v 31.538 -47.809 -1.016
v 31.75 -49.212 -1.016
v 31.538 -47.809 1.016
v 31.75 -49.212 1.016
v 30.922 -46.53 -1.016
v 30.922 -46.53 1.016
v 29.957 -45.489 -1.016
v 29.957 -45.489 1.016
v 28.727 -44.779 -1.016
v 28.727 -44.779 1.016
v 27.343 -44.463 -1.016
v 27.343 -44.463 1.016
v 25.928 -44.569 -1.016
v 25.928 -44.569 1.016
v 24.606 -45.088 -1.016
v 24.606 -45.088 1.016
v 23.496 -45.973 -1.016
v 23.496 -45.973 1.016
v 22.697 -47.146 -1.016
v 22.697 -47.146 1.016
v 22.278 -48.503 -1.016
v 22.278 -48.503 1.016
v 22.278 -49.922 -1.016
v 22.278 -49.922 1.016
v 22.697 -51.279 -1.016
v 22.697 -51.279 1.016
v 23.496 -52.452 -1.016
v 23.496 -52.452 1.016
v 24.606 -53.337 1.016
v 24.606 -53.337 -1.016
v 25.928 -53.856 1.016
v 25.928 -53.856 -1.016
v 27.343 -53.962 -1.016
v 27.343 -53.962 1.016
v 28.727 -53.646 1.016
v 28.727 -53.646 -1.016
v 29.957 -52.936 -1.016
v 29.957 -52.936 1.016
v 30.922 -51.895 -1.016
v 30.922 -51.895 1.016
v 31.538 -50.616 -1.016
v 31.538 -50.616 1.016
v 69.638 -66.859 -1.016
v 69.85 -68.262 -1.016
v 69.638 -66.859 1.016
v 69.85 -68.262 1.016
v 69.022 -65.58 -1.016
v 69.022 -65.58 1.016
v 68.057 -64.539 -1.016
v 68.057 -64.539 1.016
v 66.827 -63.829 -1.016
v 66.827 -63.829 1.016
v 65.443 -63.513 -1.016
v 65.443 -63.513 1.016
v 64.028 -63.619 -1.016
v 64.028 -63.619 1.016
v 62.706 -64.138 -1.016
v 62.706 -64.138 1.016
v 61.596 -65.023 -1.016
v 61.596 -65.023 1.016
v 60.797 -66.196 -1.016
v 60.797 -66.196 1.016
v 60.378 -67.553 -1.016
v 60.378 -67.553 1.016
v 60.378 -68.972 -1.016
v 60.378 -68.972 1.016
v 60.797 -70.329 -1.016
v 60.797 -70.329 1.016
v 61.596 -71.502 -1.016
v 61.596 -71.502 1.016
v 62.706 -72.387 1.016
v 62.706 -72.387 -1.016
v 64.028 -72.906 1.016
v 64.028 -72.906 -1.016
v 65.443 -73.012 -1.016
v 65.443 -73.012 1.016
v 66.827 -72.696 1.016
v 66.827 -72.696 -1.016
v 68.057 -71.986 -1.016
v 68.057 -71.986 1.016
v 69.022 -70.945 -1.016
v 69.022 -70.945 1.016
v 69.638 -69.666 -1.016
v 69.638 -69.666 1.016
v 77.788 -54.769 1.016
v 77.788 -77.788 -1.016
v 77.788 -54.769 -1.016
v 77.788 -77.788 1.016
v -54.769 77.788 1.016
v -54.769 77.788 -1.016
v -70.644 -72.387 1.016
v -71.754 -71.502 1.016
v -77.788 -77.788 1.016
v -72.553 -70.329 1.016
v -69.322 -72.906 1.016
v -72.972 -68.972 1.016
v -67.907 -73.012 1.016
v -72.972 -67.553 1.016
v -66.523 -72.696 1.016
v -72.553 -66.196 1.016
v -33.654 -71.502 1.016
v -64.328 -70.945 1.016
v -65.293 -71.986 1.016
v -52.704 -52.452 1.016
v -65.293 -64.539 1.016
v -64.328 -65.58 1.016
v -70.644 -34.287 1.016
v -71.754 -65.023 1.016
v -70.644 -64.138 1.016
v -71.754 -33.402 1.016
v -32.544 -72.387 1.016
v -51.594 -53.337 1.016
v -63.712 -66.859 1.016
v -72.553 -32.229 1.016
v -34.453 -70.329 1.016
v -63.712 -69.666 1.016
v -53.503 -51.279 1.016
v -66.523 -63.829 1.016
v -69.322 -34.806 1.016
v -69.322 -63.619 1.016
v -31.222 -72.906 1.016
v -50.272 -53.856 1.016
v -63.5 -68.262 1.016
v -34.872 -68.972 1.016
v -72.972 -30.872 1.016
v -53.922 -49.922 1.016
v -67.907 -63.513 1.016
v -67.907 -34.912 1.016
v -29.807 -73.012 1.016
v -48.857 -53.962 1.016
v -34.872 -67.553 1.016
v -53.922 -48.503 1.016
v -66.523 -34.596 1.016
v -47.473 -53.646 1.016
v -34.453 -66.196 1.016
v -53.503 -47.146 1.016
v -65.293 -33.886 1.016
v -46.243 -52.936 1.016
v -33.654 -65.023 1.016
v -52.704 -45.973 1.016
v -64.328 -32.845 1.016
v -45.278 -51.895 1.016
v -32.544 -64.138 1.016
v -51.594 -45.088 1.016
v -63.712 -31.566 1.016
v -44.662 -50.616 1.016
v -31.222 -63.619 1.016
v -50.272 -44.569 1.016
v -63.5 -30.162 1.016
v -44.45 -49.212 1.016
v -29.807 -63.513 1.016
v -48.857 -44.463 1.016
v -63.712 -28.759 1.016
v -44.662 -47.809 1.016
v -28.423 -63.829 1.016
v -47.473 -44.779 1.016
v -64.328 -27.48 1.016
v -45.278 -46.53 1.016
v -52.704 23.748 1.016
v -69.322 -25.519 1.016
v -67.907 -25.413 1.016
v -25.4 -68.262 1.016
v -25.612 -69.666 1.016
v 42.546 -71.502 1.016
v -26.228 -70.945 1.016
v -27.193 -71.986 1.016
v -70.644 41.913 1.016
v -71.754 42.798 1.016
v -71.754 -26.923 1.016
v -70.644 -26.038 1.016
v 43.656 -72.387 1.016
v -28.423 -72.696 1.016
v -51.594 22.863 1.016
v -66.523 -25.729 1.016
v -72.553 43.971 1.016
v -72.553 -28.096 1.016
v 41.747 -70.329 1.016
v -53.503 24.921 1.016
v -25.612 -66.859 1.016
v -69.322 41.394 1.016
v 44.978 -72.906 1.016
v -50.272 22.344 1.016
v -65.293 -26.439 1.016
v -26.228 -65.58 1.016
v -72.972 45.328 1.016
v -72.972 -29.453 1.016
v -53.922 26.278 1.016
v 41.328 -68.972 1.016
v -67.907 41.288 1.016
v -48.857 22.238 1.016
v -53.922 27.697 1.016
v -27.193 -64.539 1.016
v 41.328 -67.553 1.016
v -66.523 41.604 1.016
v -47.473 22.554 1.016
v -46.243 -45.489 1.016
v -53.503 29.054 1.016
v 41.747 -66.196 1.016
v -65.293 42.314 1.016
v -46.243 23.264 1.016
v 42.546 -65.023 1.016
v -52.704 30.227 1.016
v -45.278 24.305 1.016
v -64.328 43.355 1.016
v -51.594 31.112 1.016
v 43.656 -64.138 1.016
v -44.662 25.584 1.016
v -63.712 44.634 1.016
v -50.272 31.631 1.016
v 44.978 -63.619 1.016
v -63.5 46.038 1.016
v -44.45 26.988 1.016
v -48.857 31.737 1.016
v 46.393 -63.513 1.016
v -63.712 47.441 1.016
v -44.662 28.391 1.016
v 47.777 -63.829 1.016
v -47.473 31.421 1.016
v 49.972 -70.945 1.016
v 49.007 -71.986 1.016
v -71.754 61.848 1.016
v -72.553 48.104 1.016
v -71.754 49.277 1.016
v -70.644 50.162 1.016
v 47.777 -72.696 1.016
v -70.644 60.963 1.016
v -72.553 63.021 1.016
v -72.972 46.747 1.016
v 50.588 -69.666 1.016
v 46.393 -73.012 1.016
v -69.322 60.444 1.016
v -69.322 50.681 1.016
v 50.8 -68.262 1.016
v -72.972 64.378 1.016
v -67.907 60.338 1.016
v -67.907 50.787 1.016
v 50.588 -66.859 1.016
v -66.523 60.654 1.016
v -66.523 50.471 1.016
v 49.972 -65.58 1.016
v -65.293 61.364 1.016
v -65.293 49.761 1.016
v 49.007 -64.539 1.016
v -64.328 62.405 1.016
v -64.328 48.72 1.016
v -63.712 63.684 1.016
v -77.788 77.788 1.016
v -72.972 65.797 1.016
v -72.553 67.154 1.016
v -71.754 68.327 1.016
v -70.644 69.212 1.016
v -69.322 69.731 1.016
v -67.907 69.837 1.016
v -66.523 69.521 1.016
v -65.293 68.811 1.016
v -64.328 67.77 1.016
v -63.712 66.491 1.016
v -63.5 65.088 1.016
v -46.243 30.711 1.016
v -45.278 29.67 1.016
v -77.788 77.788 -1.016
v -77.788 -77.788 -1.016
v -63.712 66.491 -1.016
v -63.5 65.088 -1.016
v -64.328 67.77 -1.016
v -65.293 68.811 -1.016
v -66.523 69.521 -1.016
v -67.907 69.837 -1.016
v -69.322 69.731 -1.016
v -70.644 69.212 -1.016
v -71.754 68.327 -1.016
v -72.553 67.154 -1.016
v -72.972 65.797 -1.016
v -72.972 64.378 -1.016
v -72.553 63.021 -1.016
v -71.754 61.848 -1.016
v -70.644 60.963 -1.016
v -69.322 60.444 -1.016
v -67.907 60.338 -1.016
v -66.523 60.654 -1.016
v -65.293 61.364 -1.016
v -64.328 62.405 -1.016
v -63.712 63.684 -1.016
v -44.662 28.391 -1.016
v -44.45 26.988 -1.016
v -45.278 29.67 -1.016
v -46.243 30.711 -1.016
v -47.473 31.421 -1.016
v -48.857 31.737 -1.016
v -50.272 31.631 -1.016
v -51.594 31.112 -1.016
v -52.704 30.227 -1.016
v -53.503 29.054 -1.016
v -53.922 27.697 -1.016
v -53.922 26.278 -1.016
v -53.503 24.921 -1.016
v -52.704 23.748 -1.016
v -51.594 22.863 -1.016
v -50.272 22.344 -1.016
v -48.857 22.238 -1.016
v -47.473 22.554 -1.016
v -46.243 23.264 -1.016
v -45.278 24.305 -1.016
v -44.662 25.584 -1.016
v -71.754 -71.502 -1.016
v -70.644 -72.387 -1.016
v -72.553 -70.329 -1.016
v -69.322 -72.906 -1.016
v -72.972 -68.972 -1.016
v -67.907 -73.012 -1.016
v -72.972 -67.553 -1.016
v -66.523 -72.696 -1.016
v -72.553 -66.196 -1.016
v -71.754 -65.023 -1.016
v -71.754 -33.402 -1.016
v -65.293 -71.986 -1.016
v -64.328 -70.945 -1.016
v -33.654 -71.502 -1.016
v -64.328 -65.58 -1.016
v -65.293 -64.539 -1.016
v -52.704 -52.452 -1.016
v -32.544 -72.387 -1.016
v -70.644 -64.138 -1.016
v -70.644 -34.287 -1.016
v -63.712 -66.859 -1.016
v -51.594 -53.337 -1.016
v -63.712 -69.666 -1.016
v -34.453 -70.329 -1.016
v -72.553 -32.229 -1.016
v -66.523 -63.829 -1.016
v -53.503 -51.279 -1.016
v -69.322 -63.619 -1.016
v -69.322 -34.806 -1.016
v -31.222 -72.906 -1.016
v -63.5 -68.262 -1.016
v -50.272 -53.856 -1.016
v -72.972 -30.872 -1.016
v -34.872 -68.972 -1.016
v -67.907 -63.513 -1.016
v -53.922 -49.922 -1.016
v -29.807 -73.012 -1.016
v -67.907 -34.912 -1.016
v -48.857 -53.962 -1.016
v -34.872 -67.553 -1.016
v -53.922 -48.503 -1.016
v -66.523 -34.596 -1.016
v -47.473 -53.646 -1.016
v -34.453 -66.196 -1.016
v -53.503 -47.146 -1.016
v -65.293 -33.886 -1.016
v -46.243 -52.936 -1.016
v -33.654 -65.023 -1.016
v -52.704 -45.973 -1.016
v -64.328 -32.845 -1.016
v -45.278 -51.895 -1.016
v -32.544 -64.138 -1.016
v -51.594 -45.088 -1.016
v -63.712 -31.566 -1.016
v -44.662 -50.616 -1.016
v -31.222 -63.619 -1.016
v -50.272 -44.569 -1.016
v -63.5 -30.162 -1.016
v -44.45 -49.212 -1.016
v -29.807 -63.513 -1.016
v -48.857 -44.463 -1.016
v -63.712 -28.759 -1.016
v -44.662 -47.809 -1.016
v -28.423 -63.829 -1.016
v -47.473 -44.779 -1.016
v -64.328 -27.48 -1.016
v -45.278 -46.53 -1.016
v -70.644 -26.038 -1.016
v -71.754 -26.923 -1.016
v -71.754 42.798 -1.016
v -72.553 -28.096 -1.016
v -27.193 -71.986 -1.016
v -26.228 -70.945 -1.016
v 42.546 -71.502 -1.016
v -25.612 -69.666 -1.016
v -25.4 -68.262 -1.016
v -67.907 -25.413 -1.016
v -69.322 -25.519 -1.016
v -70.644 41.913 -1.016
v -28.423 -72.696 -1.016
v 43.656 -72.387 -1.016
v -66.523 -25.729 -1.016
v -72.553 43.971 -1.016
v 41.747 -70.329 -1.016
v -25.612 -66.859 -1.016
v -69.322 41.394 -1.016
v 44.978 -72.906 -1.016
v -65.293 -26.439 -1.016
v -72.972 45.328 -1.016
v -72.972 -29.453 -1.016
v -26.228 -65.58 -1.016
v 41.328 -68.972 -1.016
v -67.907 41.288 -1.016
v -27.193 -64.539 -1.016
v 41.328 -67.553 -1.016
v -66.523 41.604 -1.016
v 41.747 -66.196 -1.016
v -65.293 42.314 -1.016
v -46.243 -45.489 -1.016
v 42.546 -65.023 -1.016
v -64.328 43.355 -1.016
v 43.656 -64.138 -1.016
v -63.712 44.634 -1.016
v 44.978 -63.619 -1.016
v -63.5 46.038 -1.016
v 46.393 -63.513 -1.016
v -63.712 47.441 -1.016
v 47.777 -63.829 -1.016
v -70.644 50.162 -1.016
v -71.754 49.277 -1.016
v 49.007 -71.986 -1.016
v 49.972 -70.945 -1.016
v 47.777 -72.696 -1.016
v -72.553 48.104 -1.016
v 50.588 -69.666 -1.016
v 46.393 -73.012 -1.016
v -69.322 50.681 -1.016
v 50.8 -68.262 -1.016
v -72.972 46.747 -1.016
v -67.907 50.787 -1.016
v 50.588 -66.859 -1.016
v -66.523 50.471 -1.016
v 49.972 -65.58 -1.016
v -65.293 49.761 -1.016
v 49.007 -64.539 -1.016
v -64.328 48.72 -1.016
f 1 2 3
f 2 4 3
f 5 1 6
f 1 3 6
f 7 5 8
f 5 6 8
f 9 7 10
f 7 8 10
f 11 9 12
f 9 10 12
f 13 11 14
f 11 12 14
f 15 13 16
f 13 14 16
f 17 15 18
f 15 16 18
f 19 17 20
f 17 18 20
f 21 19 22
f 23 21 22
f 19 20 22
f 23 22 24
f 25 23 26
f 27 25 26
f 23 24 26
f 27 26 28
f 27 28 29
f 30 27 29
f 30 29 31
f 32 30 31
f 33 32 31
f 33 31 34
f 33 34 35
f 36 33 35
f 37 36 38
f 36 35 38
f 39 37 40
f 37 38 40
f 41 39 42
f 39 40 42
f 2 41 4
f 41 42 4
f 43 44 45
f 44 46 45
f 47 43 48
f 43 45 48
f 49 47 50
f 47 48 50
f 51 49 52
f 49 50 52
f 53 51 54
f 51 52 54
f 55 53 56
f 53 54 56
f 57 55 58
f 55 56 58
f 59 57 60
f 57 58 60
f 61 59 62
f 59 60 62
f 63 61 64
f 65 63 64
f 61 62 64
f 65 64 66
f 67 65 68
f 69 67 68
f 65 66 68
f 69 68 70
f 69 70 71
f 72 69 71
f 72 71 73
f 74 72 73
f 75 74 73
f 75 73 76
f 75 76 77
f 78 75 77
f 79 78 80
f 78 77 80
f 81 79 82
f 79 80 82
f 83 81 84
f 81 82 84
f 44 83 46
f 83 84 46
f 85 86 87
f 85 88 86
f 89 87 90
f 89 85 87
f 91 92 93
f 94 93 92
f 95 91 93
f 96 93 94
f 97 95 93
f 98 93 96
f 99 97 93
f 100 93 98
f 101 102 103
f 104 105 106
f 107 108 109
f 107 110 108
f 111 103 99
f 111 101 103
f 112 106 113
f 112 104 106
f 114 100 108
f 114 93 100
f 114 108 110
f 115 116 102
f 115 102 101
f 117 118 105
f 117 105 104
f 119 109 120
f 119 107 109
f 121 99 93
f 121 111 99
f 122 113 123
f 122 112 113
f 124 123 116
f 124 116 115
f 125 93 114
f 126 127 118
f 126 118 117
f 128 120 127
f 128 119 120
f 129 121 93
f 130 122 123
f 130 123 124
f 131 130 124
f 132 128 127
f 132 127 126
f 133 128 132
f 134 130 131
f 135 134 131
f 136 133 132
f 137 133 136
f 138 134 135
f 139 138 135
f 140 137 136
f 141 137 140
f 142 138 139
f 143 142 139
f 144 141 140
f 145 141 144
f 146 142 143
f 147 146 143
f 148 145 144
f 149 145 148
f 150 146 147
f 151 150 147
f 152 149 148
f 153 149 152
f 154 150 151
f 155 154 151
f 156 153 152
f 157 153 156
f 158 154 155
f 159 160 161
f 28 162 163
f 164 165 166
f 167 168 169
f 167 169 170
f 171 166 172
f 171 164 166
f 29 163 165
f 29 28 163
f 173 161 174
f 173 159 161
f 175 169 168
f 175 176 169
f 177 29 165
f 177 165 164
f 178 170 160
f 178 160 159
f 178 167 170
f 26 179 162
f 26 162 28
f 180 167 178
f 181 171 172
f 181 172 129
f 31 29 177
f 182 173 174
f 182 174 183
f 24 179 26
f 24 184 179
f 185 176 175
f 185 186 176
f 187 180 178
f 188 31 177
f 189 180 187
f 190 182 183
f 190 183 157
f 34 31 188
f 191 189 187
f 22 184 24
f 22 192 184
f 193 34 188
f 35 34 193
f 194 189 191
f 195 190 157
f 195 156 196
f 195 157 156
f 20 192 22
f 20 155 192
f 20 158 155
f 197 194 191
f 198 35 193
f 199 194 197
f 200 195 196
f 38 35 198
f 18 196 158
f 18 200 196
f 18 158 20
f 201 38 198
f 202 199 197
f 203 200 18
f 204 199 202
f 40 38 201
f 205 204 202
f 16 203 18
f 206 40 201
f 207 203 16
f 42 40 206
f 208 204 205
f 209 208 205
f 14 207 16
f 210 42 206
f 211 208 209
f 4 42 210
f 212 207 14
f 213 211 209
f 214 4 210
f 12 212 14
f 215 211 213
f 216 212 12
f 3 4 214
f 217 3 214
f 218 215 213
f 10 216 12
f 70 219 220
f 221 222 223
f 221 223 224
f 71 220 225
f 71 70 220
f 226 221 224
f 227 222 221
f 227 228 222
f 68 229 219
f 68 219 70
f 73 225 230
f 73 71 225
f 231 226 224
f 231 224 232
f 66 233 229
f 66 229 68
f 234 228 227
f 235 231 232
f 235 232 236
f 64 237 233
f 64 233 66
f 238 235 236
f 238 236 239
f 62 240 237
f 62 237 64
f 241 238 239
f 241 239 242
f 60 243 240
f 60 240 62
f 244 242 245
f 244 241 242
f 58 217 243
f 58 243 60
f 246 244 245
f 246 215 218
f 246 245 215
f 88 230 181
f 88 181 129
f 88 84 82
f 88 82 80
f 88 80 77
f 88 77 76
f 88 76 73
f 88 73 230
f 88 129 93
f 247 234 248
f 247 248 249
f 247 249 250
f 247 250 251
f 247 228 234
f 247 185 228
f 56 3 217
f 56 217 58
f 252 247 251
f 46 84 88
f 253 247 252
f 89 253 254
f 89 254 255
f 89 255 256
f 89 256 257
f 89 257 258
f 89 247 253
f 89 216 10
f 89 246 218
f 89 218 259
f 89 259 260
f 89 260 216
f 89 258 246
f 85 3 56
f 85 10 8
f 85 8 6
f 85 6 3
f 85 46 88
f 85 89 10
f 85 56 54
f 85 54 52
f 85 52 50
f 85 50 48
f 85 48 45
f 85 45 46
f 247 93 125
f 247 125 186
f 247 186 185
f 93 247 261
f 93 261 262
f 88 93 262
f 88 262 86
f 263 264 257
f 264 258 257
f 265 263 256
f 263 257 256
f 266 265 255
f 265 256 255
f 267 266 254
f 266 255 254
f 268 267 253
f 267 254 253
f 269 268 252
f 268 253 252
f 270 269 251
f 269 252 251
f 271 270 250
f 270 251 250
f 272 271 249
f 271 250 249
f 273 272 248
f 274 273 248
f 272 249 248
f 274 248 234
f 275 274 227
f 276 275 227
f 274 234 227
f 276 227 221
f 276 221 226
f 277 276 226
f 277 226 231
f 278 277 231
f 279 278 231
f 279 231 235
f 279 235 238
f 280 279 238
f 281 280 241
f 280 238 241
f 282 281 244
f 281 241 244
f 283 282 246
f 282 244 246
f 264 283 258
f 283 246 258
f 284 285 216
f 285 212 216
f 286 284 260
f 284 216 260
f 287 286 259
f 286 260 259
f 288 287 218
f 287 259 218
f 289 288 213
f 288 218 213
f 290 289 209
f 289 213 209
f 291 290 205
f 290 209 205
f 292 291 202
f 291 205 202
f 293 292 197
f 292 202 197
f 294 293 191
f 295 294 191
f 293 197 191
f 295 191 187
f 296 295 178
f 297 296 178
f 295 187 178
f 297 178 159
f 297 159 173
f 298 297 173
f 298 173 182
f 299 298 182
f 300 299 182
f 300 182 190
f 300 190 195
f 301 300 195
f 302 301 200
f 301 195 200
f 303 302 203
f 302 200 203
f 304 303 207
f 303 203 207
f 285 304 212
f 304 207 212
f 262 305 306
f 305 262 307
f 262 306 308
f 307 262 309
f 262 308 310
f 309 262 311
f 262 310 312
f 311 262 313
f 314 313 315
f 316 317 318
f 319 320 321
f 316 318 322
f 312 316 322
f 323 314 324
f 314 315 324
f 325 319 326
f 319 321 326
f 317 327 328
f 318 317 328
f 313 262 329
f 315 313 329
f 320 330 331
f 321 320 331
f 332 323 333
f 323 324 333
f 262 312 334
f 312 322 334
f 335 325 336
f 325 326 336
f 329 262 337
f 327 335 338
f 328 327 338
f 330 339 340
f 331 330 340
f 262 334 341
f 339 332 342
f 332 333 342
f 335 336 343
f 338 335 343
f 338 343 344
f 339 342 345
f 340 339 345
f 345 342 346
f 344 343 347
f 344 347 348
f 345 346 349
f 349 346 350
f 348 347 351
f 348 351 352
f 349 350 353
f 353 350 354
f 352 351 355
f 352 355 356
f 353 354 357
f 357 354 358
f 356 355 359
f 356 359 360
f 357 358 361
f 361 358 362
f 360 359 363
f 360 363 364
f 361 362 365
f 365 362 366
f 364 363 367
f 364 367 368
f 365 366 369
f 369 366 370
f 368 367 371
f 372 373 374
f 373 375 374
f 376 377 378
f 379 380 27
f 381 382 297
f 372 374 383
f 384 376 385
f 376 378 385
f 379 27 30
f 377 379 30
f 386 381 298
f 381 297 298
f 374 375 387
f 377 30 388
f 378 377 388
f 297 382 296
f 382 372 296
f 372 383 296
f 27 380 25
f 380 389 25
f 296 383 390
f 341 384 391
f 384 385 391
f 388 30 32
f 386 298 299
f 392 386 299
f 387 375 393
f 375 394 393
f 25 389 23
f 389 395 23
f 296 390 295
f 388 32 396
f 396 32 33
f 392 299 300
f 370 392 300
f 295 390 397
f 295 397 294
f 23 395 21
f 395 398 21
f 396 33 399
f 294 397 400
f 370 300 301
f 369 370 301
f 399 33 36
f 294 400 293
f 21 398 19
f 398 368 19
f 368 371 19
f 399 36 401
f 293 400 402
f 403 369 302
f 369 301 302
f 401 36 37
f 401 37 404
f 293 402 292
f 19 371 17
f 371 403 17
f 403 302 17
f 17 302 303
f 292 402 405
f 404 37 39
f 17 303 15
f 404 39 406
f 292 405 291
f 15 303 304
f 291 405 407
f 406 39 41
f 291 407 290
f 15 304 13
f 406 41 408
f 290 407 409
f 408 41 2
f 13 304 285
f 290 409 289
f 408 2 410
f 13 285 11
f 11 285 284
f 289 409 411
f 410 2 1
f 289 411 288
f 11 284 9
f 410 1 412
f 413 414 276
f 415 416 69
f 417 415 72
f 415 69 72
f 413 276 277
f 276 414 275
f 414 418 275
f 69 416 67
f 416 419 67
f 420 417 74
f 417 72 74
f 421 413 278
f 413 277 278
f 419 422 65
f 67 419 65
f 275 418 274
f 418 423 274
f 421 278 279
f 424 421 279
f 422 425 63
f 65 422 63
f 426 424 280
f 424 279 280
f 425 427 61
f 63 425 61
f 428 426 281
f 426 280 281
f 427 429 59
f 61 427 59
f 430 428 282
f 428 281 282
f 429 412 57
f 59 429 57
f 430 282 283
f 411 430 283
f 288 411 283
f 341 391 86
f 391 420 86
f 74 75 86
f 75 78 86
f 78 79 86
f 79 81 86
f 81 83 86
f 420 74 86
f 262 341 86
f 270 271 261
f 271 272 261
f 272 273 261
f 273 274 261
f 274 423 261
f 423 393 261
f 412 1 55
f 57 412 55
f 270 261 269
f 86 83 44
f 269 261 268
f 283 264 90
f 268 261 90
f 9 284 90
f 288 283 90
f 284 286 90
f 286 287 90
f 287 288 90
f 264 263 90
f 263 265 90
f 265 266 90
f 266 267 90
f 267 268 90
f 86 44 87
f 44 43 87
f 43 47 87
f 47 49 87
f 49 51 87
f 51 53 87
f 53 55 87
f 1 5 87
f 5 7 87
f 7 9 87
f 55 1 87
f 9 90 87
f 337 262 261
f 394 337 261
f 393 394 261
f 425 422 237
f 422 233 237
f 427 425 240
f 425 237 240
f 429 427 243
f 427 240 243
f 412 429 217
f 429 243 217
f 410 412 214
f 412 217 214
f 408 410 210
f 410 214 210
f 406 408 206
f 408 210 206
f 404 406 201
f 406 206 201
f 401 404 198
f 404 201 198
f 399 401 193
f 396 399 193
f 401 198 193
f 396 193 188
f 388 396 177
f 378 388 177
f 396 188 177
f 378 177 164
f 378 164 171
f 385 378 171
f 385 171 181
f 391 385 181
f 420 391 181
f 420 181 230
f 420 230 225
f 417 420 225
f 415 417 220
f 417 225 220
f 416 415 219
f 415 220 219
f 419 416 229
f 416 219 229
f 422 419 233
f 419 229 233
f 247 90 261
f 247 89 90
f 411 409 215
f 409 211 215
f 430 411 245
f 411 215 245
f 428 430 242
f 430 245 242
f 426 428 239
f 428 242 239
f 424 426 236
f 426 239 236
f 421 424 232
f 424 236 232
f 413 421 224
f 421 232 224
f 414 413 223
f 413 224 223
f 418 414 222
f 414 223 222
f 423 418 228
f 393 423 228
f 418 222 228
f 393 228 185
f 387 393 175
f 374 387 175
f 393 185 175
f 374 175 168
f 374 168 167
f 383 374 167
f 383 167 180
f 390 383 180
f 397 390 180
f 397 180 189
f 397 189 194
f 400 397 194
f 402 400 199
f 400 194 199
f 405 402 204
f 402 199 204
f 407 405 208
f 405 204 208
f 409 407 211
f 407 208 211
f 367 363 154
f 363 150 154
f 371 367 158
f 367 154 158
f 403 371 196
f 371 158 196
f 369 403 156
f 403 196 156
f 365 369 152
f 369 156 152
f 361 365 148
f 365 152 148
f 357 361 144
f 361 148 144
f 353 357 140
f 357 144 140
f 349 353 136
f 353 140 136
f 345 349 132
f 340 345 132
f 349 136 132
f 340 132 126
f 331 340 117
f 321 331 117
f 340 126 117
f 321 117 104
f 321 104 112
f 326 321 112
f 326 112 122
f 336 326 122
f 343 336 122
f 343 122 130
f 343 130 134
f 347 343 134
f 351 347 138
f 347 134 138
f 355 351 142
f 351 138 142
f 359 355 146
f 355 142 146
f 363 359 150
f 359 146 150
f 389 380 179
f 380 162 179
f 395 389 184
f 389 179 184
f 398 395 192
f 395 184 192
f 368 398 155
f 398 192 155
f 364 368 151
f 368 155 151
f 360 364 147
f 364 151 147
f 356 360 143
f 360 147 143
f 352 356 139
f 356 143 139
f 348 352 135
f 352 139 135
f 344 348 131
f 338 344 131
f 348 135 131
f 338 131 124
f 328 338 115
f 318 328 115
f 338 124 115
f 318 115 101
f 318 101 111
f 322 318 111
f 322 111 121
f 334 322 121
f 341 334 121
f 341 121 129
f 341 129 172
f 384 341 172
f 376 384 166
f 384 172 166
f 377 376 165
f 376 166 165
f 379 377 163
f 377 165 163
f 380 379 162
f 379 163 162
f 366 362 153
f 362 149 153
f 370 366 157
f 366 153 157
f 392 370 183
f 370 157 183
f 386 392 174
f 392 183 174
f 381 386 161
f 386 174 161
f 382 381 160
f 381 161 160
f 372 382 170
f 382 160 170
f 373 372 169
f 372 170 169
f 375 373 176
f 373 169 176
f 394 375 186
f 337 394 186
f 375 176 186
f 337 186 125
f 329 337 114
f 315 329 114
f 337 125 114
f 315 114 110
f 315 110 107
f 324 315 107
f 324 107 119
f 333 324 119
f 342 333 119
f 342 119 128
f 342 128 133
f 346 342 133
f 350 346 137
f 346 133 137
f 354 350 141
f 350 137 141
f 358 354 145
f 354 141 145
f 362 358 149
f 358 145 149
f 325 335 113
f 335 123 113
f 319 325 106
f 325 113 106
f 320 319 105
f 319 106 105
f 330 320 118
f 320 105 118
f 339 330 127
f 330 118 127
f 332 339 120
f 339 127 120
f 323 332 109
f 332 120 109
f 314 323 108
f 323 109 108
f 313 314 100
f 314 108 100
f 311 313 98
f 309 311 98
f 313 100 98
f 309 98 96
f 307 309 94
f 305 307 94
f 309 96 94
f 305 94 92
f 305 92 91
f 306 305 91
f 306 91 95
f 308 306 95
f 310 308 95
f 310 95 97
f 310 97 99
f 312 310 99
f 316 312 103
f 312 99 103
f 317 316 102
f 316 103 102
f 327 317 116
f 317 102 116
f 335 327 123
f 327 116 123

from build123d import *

# Parameters (mm, degrees)
BOSS_EXTRUDE1_DEPTH      = 1.016
BOSS_EXTRUDE1_DEPTH_BACK = 1.016
SKETCH5_R                = 4.7625
CUT_EXTRUDE1_DEPTH       = 2.016
CUT_EXTRUDE1_DEPTH_BACK  = 2.016


with BuildPart() as part:
    # Sketch4 → Boss-Extrude1 (new body, two sides)
    with BuildSketch(Plane.XY) as boss_extrude1_sk:
        Polygon((-54.76875, 77.7875), (-77.7875, 77.7875), (-77.7875, -77.7875), (77.7875, -77.7875), (77.7875, -54.76875), align=None)
    extrude(amount=BOSS_EXTRUDE1_DEPTH)
    extrude(boss_extrude1_sk.sketch, amount=-BOSS_EXTRUDE1_DEPTH_BACK)

    # Sketch5 → Cut-Extrude1 (cut, two sides)
    with BuildSketch(Plane.XY) as cut_extrude1_sk:
        with Locations((-68.2625, 65.0875)):
            Circle(SKETCH5_R)
        with Locations((-68.2625, 46.0375)):
            Circle(SKETCH5_R)
        with Locations((-68.2625, -30.1625)):
            Circle(SKETCH5_R)
        with Locations((-49.2125, 26.9875)):
            Circle(SKETCH5_R)
        with Locations((-49.2125, -49.2125)):
            Circle(SKETCH5_R)
        with Locations((-68.2625, -68.2625)):
            Circle(SKETCH5_R)
        with Locations((-30.1625, -68.2625)):
            Circle(SKETCH5_R)
        with Locations((46.0375, -68.2625)):
            Circle(SKETCH5_R)
        with Locations((26.9875, -49.2125)):
            Circle(SKETCH5_R)
        with Locations((65.0875, -68.2625)):
            Circle(SKETCH5_R)
    extrude(amount=CUT_EXTRUDE1_DEPTH, mode=Mode.SUBTRACT)
    extrude(cut_extrude1_sk.sketch, amount=-CUT_EXTRUDE1_DEPTH_BACK, mode=Mode.SUBTRACT)


solid = part.part
